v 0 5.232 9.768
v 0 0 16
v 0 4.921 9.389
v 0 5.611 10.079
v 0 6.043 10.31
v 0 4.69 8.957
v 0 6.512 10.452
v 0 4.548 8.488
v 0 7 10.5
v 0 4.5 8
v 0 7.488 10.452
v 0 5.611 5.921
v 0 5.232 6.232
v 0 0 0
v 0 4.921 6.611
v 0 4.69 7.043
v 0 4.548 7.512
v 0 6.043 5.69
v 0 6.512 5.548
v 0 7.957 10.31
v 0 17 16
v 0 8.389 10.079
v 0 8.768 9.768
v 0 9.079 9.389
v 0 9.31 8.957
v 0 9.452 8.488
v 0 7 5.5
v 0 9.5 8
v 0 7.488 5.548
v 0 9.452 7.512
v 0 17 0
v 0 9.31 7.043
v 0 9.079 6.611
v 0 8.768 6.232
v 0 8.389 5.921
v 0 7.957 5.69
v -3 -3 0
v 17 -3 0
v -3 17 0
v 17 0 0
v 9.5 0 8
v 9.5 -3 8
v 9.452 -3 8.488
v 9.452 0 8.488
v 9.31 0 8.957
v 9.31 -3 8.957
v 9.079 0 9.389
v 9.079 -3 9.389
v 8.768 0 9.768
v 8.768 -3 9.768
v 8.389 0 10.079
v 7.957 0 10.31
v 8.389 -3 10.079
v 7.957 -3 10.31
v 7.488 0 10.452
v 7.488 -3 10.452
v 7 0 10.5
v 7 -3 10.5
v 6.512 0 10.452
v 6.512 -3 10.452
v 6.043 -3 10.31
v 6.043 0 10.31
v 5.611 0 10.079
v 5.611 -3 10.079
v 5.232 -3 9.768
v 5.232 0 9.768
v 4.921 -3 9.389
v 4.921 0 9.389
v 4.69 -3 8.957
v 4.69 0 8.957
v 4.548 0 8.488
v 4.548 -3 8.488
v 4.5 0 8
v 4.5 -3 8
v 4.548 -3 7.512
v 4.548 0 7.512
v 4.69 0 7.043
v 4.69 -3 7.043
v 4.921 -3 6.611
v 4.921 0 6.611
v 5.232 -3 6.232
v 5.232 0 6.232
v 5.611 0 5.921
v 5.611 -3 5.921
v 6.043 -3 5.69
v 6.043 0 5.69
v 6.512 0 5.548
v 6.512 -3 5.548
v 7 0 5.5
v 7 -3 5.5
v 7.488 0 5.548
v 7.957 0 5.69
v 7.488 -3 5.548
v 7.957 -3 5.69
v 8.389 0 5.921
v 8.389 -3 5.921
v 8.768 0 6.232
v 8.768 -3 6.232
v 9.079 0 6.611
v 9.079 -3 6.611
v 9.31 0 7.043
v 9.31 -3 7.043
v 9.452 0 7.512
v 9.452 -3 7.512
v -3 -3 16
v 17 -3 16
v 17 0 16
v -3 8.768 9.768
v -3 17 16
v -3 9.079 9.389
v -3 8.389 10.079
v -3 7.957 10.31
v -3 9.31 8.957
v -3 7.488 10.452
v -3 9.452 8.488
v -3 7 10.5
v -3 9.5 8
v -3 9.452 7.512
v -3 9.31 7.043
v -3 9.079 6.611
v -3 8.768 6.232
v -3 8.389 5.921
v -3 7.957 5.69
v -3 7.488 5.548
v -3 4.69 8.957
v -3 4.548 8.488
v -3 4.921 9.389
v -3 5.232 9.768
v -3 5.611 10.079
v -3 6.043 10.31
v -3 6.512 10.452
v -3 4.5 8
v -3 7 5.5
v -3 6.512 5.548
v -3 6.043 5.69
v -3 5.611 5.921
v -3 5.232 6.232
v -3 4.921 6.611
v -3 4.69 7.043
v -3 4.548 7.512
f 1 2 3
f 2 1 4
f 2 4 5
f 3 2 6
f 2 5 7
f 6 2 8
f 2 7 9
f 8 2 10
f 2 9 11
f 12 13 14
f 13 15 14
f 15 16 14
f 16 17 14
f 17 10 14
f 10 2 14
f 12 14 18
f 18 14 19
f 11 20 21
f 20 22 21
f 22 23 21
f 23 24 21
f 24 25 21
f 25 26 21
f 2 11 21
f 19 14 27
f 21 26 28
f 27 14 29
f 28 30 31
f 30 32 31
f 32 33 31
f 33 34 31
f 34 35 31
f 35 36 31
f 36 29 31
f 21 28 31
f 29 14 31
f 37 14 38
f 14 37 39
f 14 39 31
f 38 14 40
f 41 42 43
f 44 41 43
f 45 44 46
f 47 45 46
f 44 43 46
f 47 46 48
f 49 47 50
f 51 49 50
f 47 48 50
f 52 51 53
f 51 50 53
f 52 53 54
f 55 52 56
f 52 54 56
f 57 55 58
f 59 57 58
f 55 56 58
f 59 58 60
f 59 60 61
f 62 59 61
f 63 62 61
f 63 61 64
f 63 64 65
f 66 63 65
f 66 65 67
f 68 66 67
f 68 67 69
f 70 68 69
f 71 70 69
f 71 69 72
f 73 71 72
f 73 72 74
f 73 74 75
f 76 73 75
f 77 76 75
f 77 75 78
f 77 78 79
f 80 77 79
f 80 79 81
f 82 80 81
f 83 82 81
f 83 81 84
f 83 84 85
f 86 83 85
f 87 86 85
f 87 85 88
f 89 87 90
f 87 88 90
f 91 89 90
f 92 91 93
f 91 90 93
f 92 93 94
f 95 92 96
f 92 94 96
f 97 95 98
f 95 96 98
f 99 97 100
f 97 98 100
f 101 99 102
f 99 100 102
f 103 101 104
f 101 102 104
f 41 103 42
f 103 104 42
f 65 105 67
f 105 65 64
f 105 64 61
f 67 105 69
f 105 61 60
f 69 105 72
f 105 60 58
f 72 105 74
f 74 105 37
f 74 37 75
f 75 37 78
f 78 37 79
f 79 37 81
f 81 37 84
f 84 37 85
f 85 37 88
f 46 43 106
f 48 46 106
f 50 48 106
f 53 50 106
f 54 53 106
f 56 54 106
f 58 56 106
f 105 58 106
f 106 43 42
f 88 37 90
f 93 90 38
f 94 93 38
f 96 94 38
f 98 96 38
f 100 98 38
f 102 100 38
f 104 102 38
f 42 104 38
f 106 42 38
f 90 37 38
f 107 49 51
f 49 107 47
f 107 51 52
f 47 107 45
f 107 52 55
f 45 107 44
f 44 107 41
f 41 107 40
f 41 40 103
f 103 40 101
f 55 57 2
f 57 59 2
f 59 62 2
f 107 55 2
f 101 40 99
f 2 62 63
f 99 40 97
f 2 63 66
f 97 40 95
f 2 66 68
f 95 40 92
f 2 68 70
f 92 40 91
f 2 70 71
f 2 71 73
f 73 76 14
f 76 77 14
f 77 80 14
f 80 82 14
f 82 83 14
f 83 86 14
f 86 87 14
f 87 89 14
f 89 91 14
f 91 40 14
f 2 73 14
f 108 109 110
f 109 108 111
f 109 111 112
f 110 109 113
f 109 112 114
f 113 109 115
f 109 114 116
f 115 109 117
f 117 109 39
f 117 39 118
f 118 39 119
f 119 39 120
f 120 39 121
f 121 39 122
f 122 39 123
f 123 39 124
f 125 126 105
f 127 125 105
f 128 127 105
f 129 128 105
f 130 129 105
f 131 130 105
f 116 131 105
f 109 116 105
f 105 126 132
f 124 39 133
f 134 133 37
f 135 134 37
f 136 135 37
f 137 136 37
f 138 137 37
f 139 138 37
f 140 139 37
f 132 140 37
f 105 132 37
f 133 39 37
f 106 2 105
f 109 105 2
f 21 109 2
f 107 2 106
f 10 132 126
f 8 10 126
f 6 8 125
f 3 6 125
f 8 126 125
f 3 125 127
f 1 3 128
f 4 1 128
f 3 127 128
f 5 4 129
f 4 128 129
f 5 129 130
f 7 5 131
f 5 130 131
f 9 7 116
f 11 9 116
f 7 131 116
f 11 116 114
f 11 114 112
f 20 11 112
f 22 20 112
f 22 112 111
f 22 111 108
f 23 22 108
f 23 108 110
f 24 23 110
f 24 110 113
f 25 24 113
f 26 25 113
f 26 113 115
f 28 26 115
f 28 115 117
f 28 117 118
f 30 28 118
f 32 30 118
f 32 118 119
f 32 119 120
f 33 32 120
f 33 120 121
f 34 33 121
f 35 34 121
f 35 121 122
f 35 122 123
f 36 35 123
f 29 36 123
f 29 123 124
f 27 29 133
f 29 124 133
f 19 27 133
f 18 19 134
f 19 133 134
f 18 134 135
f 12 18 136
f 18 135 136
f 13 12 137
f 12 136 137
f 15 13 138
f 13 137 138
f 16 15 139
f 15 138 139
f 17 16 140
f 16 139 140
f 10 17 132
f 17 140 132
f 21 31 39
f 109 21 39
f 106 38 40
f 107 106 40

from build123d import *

# Parameters (mm, degrees)
BOSS_EXTRUDE1_DEPTH = 16
CUT_EXTRUDE1_REACH  = 32.741
SKETCH2_R           = 2.5
CUT_EXTRUDE2_REACH  = 32.741
SKETCH3_R           = 2.5


with BuildPart() as part:
    # Sketch1 → Boss-Extrude1 (new body)
    with BuildSketch(Plane.XY):
        Polygon((0, 0), (0, 17), (-3, 17), (-3, -3), (17, -3), (17, 0), align=None)
    extrude(amount=BOSS_EXTRUDE1_DEPTH)

    # Sketch2 → Cut-Extrude1 (cut, up to next)
    with BuildSketch(Plane.ZY.offset(3), mode=Mode.PRIVATE) as cut_extrude1_sk1:
        with Locations(Location((8, 7, 0), (0, 0, 270))):
            Circle(SKETCH2_R)
    cut_extrude1_tool1 = extrude(cut_extrude1_sk1.sketch, amount=-CUT_EXTRUDE1_REACH, mode=Mode.PRIVATE) & part.part
    add(cut_extrude1_tool1.solids().sort_by_distance((-3, 7, 8))[0], mode=Mode.SUBTRACT)

    # Sketch3 → Cut-Extrude2 (cut, up to next)
    with BuildSketch(Plane.XZ.offset(3), mode=Mode.PRIVATE) as cut_extrude2_sk1:
        with Locations((7, 8)):
            Circle(SKETCH3_R)
    cut_extrude2_tool1 = extrude(cut_extrude2_sk1.sketch, amount=-CUT_EXTRUDE2_REACH, mode=Mode.PRIVATE) & part.part
    add(cut_extrude2_tool1.solids().sort_by_distance((7, -3, 8))[0], mode=Mode.SUBTRACT)


solid = part.part
